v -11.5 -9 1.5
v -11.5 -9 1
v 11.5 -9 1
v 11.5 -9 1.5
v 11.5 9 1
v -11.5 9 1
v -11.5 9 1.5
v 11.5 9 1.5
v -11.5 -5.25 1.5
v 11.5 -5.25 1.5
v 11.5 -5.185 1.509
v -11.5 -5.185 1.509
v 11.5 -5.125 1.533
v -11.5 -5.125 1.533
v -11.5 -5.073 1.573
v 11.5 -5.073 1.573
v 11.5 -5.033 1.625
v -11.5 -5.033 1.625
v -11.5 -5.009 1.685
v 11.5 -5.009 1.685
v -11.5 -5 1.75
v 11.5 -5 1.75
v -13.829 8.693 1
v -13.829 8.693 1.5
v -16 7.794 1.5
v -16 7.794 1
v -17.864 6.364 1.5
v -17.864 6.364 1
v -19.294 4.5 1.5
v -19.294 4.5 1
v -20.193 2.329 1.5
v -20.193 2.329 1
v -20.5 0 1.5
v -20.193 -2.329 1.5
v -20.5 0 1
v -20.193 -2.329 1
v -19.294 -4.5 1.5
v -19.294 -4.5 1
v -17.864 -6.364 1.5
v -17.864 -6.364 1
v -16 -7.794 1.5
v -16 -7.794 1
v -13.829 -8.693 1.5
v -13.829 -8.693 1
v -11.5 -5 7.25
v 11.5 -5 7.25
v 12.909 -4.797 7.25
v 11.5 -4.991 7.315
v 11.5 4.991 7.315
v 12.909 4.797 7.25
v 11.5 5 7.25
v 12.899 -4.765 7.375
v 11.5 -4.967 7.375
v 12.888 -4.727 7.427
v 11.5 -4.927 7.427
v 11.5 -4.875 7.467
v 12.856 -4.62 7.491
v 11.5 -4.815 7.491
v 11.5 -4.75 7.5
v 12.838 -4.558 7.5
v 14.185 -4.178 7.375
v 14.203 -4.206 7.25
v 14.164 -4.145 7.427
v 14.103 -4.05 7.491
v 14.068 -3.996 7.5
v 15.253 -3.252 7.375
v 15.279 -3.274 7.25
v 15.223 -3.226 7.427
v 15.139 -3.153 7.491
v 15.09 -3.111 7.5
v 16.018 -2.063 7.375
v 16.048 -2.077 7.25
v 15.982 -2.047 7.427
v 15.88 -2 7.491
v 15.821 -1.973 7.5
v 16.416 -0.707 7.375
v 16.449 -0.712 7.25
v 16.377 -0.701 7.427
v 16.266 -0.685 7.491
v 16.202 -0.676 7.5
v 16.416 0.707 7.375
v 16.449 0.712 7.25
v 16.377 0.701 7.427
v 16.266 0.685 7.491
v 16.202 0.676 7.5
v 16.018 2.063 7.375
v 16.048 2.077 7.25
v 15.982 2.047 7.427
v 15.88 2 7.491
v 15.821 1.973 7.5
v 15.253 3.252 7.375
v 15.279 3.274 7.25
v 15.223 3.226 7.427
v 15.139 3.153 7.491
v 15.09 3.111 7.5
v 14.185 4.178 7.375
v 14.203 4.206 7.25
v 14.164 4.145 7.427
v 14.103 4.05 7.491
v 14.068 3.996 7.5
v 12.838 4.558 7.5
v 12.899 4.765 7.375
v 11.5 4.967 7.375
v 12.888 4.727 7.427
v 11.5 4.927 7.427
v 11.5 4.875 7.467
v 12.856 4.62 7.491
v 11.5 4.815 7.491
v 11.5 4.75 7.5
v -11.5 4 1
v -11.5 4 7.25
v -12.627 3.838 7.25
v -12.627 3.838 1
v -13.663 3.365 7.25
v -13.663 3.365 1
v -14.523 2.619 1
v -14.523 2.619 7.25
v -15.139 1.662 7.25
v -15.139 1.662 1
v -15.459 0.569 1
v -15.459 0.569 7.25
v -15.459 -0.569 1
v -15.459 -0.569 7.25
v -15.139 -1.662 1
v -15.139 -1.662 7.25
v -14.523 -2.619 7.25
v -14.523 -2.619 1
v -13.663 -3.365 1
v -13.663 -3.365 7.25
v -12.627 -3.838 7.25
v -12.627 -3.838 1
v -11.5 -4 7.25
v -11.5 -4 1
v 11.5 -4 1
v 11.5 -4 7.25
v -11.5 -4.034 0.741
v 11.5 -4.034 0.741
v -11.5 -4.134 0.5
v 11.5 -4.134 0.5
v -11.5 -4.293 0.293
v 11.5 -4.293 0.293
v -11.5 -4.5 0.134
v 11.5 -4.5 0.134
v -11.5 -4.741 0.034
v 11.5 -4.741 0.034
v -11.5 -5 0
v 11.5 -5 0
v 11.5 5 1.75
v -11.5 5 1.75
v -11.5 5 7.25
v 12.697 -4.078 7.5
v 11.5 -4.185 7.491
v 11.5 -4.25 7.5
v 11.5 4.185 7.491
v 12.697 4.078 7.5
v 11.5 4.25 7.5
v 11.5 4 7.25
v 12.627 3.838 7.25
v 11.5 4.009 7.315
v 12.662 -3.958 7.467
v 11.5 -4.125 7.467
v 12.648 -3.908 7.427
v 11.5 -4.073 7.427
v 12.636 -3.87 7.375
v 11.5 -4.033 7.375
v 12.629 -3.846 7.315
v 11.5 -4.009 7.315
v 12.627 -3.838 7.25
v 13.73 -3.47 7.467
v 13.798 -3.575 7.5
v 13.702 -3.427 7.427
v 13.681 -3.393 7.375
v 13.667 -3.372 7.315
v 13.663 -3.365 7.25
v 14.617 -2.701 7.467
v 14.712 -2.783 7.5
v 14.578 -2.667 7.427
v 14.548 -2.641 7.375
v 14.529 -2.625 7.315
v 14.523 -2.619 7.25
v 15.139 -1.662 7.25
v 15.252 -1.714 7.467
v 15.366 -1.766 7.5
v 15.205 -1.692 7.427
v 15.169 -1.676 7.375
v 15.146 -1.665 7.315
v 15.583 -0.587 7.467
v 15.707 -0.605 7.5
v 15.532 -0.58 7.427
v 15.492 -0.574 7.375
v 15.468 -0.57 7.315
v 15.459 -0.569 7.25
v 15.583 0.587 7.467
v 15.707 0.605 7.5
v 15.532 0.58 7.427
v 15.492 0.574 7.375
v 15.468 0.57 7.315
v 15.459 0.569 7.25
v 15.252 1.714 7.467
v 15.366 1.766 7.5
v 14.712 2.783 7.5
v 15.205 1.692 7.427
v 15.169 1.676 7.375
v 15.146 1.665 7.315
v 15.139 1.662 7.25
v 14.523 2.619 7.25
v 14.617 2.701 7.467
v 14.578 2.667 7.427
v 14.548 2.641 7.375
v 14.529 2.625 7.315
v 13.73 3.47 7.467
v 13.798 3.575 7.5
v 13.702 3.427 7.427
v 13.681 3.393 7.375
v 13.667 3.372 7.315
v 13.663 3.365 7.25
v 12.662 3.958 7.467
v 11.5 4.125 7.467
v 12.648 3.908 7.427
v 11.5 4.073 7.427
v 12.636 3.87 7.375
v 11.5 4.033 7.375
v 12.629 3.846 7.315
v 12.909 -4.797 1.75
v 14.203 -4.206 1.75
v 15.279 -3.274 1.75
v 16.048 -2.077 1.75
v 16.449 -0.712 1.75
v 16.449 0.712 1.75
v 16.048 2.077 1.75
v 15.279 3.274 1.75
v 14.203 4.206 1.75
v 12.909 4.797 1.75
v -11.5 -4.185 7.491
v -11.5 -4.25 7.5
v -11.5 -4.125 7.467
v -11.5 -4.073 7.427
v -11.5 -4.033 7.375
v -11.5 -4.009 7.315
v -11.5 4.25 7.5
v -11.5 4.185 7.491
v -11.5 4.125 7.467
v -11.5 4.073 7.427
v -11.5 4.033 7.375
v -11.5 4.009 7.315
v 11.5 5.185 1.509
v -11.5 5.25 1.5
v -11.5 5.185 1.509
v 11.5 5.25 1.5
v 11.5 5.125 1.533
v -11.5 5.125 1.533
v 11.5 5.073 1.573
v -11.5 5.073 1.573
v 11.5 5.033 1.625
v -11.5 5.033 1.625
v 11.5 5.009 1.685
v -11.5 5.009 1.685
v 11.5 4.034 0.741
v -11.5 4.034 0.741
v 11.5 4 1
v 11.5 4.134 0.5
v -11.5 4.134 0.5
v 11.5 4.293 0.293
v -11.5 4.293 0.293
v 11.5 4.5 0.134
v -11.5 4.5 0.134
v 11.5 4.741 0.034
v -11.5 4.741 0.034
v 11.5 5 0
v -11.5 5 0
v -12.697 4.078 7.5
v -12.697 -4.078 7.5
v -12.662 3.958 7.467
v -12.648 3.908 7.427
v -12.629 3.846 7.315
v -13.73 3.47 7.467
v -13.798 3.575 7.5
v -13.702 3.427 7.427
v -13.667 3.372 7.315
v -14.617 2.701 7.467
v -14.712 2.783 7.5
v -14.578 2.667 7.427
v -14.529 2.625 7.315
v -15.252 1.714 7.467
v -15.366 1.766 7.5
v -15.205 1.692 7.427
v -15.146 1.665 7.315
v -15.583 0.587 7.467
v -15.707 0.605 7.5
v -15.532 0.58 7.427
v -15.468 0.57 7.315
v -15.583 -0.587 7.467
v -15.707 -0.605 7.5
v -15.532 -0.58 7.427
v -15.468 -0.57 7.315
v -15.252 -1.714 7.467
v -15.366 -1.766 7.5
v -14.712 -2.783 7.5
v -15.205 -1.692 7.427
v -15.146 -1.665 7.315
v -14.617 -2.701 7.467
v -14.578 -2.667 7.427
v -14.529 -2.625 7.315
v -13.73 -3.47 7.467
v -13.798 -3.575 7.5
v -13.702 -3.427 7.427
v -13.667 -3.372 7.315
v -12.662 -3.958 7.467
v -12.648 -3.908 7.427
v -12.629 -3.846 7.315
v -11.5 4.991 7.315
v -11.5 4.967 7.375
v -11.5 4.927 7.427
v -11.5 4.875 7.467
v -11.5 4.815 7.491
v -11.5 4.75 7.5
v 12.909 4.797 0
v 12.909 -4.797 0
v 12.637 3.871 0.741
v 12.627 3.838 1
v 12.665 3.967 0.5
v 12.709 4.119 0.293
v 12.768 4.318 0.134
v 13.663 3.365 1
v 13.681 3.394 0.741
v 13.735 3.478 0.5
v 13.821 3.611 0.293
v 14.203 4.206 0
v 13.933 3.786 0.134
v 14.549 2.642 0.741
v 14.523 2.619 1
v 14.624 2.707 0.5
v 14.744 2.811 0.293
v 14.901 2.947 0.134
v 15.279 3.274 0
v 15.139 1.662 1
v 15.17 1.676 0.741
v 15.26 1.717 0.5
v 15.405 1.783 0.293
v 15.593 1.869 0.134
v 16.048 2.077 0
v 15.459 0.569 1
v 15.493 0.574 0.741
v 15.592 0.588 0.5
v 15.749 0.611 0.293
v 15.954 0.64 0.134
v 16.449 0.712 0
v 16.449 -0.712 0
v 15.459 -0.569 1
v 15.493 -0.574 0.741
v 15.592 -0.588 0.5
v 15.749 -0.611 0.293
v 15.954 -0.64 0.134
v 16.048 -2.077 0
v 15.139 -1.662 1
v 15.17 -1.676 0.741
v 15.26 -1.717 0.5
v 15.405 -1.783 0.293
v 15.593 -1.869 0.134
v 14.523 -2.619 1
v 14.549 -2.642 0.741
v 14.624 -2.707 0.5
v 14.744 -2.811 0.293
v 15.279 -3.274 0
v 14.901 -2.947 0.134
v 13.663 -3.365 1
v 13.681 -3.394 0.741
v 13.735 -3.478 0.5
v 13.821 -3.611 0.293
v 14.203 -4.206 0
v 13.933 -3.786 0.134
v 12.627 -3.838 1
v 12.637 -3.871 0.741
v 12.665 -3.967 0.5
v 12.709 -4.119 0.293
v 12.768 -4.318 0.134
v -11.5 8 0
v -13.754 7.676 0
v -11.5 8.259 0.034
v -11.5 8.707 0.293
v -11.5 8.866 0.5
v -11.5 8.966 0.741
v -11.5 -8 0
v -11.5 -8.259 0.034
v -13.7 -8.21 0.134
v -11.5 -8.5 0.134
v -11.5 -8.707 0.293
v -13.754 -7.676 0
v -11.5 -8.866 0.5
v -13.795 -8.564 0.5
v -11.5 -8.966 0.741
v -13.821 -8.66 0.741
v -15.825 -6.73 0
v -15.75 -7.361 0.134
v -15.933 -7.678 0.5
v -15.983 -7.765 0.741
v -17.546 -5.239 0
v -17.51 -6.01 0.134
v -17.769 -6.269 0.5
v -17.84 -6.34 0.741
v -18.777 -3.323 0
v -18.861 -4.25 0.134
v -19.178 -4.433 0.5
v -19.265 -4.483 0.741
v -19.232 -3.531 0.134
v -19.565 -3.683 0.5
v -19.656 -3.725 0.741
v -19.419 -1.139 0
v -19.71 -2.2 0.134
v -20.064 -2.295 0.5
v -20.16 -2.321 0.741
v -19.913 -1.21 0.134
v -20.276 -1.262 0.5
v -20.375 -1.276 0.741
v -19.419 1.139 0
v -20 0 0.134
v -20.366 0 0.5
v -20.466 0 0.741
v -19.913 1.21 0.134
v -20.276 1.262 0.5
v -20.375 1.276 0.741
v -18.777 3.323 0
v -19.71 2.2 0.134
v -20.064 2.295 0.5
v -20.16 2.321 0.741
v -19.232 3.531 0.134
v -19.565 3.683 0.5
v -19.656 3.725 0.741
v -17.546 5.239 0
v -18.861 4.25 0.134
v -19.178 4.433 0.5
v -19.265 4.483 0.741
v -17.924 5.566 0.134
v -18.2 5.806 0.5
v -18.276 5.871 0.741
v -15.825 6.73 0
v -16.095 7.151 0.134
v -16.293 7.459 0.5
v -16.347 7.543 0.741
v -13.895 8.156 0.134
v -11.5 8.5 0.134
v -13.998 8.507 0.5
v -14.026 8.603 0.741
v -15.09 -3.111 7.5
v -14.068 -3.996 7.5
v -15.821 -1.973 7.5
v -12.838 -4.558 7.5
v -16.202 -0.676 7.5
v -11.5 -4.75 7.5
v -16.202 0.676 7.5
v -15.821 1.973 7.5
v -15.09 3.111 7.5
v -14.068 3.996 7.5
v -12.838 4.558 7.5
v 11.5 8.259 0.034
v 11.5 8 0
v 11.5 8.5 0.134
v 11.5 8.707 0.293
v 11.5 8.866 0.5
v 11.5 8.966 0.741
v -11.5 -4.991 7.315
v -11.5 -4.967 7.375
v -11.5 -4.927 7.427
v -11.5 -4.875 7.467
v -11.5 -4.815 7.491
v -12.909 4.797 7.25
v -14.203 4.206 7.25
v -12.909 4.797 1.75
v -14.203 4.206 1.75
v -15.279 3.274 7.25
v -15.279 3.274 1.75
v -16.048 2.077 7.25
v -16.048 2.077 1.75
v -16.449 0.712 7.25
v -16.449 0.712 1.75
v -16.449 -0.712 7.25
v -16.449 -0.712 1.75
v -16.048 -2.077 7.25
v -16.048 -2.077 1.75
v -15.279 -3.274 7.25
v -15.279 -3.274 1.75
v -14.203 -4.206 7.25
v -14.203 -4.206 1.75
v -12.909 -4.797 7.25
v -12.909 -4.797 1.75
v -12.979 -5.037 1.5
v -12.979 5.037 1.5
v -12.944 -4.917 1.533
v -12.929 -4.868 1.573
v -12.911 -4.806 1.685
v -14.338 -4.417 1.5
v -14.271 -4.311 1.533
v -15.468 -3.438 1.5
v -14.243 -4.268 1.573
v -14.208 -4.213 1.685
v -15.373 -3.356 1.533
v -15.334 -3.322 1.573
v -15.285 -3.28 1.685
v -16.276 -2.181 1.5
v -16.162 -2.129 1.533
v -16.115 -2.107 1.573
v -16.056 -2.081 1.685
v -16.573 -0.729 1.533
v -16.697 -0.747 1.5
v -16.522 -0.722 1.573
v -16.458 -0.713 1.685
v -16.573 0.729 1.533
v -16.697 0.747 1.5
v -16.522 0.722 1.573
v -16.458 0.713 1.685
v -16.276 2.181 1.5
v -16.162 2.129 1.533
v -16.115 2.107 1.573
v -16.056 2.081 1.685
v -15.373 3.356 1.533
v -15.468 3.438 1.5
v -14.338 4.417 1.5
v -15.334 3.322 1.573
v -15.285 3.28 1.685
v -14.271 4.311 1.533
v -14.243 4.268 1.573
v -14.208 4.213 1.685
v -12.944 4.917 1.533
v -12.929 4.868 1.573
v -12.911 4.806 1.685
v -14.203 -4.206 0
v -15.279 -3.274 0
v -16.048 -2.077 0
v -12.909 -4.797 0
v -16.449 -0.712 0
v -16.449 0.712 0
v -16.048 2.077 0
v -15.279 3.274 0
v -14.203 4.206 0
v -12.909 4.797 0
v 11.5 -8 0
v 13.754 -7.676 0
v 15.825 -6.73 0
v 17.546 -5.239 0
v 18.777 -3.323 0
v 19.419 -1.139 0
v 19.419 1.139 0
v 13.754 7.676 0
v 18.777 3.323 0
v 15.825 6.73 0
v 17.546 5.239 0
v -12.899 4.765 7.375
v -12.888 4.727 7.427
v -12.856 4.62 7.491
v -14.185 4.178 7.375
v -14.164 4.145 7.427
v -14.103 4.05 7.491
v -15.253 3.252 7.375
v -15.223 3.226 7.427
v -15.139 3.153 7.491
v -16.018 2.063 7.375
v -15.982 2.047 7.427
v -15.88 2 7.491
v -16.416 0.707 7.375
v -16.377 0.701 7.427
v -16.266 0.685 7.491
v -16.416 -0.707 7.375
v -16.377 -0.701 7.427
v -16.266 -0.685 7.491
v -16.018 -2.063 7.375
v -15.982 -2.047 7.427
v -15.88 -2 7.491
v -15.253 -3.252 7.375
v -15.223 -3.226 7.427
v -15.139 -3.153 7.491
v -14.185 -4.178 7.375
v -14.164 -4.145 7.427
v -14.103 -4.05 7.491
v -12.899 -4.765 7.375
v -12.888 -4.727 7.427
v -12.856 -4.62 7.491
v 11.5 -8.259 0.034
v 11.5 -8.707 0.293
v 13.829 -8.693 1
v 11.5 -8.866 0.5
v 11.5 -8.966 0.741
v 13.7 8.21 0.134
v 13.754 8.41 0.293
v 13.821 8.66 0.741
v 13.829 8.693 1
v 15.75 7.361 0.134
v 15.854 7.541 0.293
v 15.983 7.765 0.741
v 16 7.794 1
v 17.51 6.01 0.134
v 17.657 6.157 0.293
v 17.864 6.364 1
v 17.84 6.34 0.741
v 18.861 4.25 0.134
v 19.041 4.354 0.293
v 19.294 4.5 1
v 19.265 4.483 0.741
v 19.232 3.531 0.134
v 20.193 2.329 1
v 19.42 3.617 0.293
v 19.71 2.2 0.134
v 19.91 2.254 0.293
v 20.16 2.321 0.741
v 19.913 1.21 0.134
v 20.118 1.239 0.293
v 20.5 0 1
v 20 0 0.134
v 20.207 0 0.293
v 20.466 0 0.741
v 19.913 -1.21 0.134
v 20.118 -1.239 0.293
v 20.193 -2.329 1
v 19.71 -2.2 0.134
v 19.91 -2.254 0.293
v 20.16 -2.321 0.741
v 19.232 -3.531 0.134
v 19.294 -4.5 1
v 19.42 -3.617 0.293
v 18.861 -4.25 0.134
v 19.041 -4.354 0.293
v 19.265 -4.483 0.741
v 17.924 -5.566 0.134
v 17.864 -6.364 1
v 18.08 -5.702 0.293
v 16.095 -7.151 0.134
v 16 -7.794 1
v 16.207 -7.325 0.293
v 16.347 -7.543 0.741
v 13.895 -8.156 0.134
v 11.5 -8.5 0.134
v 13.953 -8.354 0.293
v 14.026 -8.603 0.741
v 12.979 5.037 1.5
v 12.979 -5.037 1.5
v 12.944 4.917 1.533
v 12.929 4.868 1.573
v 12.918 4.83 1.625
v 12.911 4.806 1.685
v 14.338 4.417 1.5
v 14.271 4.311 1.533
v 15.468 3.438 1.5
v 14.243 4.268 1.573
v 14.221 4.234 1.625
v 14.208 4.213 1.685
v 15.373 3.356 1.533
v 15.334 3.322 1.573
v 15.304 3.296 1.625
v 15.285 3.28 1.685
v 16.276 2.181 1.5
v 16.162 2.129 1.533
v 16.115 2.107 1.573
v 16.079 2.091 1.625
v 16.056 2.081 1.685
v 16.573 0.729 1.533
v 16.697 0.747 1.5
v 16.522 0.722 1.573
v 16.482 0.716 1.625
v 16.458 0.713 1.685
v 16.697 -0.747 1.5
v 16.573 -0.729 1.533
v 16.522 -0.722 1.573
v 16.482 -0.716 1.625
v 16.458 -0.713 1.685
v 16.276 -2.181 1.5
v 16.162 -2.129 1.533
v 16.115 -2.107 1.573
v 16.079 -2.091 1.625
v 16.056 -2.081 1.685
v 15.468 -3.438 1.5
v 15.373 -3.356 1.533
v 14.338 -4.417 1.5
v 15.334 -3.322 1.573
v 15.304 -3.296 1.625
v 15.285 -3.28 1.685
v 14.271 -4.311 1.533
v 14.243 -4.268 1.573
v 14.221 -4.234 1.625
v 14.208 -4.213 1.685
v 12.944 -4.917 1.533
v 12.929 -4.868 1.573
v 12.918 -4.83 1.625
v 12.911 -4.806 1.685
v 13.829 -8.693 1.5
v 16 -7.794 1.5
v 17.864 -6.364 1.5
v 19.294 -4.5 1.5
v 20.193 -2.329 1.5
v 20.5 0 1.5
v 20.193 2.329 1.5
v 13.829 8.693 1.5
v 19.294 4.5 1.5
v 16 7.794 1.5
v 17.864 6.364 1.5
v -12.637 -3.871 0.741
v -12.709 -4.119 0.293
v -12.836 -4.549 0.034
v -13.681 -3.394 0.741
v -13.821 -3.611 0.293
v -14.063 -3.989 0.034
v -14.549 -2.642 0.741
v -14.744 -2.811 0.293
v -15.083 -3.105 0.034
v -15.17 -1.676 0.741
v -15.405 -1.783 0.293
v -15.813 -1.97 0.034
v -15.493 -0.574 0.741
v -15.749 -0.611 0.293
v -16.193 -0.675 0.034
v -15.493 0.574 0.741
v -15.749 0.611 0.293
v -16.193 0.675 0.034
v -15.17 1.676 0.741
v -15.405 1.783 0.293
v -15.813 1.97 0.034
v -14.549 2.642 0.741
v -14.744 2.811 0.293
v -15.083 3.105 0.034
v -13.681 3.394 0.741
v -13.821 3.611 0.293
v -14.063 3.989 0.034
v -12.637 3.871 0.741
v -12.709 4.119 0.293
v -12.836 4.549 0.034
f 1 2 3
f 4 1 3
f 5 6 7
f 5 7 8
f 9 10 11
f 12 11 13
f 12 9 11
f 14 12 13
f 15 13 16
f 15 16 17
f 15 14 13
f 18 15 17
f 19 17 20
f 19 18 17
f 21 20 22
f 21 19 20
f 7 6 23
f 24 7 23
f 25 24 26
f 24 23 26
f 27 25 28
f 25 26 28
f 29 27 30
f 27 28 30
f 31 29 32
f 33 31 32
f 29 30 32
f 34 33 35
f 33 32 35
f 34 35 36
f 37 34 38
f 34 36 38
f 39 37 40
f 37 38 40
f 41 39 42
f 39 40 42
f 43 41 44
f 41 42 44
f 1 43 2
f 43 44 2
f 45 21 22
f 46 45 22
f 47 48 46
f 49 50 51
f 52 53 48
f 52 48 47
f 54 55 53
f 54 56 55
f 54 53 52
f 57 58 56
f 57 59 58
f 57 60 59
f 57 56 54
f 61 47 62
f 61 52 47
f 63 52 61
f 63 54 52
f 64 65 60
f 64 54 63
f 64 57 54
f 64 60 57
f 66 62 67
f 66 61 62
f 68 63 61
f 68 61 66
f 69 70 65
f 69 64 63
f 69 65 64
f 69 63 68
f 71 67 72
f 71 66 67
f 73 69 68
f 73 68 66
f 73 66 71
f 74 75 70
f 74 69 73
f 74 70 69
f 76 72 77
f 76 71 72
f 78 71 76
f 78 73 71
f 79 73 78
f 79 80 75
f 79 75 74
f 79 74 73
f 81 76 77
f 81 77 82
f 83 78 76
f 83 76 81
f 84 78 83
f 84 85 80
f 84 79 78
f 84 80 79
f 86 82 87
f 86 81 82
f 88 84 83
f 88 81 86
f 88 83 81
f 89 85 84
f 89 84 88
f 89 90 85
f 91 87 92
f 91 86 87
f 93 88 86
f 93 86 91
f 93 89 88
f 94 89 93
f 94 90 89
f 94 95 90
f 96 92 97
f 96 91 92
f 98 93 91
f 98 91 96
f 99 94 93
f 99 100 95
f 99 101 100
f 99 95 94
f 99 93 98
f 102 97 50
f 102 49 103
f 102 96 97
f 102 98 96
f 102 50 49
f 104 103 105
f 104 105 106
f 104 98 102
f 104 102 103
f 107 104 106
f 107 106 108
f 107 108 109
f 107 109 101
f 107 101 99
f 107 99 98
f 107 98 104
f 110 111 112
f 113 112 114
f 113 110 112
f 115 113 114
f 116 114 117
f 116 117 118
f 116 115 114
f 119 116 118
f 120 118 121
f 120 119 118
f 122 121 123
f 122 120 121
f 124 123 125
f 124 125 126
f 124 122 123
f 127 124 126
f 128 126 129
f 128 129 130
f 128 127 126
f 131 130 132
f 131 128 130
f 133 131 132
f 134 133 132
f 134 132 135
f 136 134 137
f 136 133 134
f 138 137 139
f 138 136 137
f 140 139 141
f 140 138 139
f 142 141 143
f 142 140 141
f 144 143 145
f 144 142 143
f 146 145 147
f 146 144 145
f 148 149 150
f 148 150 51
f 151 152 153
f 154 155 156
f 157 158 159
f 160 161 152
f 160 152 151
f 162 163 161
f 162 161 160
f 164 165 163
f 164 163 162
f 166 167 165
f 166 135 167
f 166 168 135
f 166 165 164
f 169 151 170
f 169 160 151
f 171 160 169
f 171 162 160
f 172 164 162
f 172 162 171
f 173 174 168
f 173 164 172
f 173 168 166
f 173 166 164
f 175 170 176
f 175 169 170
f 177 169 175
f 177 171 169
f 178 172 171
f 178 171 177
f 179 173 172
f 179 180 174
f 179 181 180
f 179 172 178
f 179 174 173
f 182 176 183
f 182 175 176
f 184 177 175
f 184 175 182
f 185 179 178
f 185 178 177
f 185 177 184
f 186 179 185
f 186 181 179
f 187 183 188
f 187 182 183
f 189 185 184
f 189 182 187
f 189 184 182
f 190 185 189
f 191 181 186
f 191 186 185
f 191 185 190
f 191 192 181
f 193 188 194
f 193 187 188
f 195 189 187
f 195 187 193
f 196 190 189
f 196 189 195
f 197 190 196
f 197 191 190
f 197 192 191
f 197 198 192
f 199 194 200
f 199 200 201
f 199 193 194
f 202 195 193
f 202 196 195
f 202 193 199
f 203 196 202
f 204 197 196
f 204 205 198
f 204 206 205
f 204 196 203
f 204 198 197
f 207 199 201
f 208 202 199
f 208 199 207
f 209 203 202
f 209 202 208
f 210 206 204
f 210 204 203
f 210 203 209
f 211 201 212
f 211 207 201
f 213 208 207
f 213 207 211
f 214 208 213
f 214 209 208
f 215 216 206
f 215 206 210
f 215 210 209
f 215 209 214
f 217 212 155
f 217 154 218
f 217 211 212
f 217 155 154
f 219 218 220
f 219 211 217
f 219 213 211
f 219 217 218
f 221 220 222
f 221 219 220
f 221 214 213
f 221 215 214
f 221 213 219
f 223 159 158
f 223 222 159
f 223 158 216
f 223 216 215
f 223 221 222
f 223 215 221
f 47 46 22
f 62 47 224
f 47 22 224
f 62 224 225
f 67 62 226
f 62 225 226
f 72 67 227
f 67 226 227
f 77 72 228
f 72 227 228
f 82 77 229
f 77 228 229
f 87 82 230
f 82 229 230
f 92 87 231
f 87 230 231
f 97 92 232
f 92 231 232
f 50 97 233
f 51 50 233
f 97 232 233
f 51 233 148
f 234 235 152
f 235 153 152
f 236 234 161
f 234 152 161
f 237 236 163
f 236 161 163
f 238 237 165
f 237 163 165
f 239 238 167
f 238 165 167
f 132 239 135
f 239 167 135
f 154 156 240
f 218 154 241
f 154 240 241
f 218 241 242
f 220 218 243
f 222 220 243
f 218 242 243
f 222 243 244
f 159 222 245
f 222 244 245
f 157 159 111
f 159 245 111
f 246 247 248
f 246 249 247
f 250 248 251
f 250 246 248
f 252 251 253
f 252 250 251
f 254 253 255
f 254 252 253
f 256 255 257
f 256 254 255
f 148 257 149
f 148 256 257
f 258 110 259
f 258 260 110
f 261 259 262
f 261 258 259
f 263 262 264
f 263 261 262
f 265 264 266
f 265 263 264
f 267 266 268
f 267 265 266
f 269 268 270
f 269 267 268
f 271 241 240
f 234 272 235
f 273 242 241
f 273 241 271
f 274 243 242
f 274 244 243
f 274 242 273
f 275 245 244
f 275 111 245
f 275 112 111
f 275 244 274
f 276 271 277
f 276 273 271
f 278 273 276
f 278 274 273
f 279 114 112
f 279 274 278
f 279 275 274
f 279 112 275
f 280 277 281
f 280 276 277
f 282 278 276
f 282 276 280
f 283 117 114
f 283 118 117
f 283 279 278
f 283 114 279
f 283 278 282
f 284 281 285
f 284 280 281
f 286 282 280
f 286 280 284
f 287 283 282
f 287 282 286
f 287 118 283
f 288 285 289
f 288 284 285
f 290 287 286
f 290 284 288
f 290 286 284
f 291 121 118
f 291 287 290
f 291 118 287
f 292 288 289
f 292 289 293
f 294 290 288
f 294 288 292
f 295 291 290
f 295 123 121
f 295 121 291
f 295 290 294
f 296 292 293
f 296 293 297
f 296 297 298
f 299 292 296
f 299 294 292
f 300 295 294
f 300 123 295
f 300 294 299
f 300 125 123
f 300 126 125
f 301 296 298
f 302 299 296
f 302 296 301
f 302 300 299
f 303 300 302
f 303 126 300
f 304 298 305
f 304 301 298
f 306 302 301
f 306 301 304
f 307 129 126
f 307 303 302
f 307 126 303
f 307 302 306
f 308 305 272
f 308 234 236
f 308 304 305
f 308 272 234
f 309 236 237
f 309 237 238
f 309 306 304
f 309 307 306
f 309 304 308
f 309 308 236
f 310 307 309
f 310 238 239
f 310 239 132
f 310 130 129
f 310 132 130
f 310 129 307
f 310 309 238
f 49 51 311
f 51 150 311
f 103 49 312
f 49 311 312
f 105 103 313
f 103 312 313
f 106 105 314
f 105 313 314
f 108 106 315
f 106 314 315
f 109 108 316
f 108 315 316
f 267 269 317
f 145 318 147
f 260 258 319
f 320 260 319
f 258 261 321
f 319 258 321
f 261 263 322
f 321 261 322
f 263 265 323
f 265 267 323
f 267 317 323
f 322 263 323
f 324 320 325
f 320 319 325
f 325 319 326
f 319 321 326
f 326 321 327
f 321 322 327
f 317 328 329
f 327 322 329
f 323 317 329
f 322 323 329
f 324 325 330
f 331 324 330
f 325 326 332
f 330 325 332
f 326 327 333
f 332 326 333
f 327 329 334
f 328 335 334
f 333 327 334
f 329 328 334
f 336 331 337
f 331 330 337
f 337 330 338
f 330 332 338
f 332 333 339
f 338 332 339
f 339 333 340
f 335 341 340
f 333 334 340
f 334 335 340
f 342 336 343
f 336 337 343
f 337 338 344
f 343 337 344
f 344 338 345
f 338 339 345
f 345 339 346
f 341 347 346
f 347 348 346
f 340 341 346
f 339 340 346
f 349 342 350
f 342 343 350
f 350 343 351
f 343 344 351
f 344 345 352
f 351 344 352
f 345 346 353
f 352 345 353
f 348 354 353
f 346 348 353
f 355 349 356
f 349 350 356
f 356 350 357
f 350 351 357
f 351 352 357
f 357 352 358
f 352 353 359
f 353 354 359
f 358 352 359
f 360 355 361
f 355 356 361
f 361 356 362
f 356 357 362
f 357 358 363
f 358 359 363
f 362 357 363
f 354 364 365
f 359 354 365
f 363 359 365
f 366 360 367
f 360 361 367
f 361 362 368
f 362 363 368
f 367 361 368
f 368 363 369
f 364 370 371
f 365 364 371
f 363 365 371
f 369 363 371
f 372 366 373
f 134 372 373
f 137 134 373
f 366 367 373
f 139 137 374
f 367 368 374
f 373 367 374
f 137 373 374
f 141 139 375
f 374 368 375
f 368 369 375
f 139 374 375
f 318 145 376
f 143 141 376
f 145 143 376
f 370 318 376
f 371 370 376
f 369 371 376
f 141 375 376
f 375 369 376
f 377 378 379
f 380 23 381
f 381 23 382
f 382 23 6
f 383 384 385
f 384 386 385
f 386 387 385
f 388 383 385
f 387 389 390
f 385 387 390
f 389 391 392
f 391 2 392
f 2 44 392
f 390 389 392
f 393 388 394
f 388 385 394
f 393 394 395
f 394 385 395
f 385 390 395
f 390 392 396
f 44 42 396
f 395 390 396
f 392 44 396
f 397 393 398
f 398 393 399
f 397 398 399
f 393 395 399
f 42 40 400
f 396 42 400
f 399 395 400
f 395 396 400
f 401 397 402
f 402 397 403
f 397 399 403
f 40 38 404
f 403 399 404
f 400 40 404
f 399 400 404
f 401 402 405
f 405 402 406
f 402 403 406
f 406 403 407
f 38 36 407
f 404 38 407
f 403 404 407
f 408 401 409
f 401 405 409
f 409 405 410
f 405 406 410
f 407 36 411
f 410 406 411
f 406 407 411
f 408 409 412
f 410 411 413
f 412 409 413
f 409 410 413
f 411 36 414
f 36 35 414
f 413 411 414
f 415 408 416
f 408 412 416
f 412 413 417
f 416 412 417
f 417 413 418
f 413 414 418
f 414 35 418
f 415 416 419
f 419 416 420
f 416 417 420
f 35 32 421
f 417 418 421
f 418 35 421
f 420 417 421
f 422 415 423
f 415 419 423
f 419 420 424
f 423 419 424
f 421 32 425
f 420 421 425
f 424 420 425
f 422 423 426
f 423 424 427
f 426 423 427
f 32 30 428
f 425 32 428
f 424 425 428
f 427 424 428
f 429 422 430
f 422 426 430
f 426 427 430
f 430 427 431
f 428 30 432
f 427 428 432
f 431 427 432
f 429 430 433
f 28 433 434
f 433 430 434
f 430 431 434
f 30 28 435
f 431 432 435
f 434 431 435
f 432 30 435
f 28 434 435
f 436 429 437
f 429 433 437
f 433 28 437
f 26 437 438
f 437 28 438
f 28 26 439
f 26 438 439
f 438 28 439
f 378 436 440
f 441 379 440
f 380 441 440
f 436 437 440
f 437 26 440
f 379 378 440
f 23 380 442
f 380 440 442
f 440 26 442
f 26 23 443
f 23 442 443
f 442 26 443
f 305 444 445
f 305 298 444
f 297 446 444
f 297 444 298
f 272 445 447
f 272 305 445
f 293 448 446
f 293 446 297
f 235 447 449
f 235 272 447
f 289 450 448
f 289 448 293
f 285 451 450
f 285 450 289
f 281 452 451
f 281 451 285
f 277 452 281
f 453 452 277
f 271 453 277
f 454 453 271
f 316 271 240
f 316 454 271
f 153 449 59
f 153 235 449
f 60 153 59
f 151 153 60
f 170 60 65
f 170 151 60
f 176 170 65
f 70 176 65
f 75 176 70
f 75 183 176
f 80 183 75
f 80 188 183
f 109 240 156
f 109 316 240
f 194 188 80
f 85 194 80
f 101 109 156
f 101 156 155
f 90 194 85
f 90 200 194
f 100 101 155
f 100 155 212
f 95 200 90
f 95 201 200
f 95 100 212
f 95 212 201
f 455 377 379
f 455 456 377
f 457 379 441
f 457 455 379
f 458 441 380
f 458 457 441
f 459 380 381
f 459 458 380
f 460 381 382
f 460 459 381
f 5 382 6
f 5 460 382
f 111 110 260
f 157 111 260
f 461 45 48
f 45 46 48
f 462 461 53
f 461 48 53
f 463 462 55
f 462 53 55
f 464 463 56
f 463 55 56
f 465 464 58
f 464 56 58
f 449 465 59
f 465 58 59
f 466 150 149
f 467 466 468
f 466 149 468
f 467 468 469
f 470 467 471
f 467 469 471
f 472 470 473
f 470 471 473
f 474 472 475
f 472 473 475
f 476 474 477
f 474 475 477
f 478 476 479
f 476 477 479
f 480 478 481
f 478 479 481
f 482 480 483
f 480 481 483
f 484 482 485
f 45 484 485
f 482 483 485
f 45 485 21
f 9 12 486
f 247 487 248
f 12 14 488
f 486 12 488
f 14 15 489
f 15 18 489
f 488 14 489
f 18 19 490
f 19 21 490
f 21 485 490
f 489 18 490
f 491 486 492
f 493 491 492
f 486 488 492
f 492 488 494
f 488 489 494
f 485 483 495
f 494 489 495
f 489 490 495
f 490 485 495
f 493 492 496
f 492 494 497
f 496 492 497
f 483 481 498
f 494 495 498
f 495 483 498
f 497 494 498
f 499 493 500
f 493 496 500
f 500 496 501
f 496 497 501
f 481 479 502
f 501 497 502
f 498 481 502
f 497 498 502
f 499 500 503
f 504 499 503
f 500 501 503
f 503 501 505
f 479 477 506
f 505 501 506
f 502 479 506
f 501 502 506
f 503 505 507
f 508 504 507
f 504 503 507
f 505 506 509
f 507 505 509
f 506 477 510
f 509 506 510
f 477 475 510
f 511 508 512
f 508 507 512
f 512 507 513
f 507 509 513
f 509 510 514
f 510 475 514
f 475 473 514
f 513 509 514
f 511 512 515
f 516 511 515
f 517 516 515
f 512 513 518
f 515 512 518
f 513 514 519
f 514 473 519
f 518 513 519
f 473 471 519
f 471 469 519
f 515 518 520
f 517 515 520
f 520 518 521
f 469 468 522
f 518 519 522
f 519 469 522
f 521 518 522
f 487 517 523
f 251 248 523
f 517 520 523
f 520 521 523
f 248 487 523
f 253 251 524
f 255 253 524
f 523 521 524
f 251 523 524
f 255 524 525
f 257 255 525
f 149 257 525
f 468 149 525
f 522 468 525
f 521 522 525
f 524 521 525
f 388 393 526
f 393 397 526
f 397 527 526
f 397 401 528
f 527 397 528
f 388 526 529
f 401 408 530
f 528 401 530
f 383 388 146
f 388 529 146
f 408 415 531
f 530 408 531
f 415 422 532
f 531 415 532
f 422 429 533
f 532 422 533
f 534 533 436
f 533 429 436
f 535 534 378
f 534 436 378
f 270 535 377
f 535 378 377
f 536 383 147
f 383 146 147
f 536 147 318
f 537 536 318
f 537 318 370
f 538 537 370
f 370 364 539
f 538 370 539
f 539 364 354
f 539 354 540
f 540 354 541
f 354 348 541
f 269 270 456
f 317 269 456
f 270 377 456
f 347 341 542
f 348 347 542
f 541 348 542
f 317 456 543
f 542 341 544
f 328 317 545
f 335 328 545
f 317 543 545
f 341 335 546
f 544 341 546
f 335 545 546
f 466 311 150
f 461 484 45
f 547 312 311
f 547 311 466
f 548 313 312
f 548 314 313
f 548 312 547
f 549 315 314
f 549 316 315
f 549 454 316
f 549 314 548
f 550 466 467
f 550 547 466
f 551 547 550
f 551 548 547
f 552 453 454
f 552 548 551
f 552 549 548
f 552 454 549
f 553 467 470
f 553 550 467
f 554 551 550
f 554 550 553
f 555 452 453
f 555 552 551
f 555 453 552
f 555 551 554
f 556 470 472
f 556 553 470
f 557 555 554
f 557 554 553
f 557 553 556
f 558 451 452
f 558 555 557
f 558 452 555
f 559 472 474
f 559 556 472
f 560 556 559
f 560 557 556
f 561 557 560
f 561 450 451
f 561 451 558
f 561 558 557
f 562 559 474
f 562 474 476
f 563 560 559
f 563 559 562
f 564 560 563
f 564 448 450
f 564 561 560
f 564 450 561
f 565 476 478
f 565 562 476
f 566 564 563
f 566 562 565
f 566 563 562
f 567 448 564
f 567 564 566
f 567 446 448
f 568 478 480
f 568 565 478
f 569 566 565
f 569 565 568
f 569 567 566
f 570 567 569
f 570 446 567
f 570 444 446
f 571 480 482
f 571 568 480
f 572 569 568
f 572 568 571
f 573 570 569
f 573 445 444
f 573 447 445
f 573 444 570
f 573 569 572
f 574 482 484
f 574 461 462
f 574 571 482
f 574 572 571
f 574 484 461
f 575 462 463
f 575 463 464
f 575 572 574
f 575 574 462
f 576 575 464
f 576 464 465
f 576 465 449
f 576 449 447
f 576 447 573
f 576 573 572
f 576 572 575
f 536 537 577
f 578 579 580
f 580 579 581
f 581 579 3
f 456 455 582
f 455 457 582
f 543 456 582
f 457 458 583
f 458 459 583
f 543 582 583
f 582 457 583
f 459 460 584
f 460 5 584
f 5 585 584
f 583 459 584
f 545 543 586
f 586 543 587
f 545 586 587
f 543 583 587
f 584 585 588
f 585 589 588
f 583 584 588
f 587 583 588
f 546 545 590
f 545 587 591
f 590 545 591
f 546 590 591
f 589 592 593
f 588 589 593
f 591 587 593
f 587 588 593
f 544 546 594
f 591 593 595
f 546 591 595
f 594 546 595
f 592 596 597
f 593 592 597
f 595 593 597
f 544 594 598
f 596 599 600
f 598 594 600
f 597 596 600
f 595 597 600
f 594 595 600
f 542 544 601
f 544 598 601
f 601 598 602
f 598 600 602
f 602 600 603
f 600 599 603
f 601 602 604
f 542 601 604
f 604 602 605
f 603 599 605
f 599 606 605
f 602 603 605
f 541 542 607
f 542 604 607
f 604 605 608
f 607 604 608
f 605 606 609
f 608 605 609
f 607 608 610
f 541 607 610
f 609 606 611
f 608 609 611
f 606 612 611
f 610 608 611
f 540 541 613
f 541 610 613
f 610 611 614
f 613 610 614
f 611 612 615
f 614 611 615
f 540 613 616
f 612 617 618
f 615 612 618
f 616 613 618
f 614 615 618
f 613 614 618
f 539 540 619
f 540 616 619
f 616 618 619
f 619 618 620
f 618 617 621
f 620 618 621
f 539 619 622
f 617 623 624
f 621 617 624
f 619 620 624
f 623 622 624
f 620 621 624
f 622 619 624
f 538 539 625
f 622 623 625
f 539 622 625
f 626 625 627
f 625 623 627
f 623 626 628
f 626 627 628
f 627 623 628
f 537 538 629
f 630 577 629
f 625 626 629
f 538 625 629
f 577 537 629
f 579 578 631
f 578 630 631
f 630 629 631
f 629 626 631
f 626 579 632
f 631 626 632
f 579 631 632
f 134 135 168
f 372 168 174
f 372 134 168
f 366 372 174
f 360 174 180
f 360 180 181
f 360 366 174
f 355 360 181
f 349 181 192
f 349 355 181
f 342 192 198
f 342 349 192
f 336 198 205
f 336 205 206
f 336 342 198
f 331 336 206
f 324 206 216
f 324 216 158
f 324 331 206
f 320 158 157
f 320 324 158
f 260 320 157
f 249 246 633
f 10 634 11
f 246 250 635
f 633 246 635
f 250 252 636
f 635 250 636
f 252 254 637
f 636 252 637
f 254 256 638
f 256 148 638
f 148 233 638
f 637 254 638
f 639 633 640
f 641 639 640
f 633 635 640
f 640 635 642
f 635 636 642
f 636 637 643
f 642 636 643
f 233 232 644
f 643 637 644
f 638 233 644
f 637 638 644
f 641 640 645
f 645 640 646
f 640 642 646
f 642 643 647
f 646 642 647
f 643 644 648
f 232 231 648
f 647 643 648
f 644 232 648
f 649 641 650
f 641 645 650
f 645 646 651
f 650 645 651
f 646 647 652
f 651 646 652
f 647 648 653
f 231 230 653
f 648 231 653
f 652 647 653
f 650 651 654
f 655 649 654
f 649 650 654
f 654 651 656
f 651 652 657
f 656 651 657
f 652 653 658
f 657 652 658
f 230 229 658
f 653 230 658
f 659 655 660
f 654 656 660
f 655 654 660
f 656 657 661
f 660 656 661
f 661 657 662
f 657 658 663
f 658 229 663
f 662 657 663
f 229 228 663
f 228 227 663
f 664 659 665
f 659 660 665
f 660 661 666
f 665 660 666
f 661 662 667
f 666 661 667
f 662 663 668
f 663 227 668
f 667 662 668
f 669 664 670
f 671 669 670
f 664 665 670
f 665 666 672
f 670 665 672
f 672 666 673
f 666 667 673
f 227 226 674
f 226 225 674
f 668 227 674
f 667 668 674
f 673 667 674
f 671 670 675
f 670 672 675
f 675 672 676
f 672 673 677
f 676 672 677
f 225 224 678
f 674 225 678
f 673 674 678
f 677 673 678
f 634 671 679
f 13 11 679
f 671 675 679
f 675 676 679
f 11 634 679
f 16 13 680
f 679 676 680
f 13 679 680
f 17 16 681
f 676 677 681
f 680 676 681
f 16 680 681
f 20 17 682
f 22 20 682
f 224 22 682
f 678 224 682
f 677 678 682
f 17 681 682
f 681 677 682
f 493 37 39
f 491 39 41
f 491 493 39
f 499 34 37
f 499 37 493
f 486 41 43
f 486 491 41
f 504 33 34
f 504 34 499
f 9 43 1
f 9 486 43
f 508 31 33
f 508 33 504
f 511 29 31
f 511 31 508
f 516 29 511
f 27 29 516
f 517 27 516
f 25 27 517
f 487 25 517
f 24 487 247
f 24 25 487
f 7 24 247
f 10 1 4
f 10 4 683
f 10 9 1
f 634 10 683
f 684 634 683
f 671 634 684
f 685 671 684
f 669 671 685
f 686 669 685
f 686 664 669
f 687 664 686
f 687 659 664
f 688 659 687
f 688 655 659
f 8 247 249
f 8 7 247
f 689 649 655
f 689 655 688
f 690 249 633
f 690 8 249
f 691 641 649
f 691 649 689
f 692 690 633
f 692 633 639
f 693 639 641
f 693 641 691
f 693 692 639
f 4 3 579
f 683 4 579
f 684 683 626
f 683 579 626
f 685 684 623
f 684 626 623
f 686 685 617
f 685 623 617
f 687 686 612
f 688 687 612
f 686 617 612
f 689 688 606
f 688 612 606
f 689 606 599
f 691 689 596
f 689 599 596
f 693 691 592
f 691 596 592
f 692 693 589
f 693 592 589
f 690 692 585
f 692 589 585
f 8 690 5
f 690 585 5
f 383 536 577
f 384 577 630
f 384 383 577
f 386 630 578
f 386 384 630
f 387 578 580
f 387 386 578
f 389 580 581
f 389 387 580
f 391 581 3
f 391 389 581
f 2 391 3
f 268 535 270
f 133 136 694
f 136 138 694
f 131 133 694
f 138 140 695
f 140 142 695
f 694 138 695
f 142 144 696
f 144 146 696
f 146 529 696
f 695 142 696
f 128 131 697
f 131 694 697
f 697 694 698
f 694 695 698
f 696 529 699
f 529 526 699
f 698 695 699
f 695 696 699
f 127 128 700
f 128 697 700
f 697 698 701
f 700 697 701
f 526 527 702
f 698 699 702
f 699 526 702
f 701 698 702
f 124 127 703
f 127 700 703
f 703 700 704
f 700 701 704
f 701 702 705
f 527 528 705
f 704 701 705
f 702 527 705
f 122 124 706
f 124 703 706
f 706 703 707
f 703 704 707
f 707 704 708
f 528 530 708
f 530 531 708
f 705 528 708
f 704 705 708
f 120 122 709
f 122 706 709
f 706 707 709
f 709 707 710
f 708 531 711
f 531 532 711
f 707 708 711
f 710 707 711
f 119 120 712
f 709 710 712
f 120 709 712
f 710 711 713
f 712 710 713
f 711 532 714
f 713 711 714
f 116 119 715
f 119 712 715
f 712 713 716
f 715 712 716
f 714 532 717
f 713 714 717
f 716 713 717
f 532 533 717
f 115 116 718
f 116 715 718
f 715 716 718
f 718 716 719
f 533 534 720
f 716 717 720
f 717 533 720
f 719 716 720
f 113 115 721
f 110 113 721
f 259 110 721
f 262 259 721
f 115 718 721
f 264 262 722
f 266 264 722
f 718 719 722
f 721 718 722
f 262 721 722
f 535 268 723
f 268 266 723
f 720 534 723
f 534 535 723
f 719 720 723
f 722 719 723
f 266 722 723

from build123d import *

# Parameters (mm, degrees)
PAD_DEPTH    = 7.5
PAD001_DEPTH = 1.5
FILLET_R     = 1
FILLET001_R  = 0.25
FILLET002_R  = 0.25


with BuildPart() as part:
    # Sketch → Pad (new body)
    with BuildSketch(Plane.XY):
        with BuildLine():
            ThreePointArc((-11.5, 5), (-16.5, 0), (-11.5, -5))
            Line((-11.5, -5), (11.5, -5))
            ThreePointArc((11.5, -5), (16.5, 0), (11.5, 5))
            Line((-11.5, 5), (11.5, 5))
        make_face()
        with BuildLine():
            ThreePointArc((-11.5, 4), (-15.5, 0), (-11.5, -4))
            Line((-11.5, -4), (11.5, -4))
            ThreePointArc((11.5, -4), (15.5, 0), (11.5, 4))
            Line((-11.5, 4), (11.5, 4))
        make_face(mode=Mode.SUBTRACT)
    extrude(amount=PAD_DEPTH)

    # Sketch001 → Pad001 (join)
    with BuildSketch(Plane.XY):
        with BuildLine():
            ThreePointArc((-11.5, 9), (-20.5, 0), (-11.5, -9))
            Line((-11.5, -9), (11.5, -9))
            ThreePointArc((11.5, -9), (20.5, 0), (11.5, 9))
            Line((-11.5, 9), (11.5, 9))
        make_face()
        with BuildLine():
            ThreePointArc((-11.5, 4), (-15.5, 0), (-11.5, -4))
            Line((-11.5, -4), (11.5, -4))
            ThreePointArc((11.5, -4), (15.5, 0), (11.5, 4))
            Line((-11.5, 4), (11.5, 4))
        make_face(mode=Mode.SUBTRACT)
    extrude(amount=PAD001_DEPTH)

    # Fillet
    fillet_edges = [part.edges().sort_by_distance(p)[0] for p in [
        (0, 9, 0),
        (0, 4, 0),
    ]]
    fillet(fillet_edges, radius=FILLET_R)

    # Fillet001
    fillet001_edges = [part.edges().sort_by_distance(p)[0] for p in [
        (0, -5, 7.5),
        (0, -4, 7.5),
    ]]
    fillet(fillet001_edges, radius=FILLET001_R)

    # Fillet002
    fillet002_edges = [part.edges().sort_by_distance(p)[0] for p in [
        (0, 5, 1.5),
    ]]
    fillet(fillet002_edges, radius=FILLET002_R)


solid = part.part
